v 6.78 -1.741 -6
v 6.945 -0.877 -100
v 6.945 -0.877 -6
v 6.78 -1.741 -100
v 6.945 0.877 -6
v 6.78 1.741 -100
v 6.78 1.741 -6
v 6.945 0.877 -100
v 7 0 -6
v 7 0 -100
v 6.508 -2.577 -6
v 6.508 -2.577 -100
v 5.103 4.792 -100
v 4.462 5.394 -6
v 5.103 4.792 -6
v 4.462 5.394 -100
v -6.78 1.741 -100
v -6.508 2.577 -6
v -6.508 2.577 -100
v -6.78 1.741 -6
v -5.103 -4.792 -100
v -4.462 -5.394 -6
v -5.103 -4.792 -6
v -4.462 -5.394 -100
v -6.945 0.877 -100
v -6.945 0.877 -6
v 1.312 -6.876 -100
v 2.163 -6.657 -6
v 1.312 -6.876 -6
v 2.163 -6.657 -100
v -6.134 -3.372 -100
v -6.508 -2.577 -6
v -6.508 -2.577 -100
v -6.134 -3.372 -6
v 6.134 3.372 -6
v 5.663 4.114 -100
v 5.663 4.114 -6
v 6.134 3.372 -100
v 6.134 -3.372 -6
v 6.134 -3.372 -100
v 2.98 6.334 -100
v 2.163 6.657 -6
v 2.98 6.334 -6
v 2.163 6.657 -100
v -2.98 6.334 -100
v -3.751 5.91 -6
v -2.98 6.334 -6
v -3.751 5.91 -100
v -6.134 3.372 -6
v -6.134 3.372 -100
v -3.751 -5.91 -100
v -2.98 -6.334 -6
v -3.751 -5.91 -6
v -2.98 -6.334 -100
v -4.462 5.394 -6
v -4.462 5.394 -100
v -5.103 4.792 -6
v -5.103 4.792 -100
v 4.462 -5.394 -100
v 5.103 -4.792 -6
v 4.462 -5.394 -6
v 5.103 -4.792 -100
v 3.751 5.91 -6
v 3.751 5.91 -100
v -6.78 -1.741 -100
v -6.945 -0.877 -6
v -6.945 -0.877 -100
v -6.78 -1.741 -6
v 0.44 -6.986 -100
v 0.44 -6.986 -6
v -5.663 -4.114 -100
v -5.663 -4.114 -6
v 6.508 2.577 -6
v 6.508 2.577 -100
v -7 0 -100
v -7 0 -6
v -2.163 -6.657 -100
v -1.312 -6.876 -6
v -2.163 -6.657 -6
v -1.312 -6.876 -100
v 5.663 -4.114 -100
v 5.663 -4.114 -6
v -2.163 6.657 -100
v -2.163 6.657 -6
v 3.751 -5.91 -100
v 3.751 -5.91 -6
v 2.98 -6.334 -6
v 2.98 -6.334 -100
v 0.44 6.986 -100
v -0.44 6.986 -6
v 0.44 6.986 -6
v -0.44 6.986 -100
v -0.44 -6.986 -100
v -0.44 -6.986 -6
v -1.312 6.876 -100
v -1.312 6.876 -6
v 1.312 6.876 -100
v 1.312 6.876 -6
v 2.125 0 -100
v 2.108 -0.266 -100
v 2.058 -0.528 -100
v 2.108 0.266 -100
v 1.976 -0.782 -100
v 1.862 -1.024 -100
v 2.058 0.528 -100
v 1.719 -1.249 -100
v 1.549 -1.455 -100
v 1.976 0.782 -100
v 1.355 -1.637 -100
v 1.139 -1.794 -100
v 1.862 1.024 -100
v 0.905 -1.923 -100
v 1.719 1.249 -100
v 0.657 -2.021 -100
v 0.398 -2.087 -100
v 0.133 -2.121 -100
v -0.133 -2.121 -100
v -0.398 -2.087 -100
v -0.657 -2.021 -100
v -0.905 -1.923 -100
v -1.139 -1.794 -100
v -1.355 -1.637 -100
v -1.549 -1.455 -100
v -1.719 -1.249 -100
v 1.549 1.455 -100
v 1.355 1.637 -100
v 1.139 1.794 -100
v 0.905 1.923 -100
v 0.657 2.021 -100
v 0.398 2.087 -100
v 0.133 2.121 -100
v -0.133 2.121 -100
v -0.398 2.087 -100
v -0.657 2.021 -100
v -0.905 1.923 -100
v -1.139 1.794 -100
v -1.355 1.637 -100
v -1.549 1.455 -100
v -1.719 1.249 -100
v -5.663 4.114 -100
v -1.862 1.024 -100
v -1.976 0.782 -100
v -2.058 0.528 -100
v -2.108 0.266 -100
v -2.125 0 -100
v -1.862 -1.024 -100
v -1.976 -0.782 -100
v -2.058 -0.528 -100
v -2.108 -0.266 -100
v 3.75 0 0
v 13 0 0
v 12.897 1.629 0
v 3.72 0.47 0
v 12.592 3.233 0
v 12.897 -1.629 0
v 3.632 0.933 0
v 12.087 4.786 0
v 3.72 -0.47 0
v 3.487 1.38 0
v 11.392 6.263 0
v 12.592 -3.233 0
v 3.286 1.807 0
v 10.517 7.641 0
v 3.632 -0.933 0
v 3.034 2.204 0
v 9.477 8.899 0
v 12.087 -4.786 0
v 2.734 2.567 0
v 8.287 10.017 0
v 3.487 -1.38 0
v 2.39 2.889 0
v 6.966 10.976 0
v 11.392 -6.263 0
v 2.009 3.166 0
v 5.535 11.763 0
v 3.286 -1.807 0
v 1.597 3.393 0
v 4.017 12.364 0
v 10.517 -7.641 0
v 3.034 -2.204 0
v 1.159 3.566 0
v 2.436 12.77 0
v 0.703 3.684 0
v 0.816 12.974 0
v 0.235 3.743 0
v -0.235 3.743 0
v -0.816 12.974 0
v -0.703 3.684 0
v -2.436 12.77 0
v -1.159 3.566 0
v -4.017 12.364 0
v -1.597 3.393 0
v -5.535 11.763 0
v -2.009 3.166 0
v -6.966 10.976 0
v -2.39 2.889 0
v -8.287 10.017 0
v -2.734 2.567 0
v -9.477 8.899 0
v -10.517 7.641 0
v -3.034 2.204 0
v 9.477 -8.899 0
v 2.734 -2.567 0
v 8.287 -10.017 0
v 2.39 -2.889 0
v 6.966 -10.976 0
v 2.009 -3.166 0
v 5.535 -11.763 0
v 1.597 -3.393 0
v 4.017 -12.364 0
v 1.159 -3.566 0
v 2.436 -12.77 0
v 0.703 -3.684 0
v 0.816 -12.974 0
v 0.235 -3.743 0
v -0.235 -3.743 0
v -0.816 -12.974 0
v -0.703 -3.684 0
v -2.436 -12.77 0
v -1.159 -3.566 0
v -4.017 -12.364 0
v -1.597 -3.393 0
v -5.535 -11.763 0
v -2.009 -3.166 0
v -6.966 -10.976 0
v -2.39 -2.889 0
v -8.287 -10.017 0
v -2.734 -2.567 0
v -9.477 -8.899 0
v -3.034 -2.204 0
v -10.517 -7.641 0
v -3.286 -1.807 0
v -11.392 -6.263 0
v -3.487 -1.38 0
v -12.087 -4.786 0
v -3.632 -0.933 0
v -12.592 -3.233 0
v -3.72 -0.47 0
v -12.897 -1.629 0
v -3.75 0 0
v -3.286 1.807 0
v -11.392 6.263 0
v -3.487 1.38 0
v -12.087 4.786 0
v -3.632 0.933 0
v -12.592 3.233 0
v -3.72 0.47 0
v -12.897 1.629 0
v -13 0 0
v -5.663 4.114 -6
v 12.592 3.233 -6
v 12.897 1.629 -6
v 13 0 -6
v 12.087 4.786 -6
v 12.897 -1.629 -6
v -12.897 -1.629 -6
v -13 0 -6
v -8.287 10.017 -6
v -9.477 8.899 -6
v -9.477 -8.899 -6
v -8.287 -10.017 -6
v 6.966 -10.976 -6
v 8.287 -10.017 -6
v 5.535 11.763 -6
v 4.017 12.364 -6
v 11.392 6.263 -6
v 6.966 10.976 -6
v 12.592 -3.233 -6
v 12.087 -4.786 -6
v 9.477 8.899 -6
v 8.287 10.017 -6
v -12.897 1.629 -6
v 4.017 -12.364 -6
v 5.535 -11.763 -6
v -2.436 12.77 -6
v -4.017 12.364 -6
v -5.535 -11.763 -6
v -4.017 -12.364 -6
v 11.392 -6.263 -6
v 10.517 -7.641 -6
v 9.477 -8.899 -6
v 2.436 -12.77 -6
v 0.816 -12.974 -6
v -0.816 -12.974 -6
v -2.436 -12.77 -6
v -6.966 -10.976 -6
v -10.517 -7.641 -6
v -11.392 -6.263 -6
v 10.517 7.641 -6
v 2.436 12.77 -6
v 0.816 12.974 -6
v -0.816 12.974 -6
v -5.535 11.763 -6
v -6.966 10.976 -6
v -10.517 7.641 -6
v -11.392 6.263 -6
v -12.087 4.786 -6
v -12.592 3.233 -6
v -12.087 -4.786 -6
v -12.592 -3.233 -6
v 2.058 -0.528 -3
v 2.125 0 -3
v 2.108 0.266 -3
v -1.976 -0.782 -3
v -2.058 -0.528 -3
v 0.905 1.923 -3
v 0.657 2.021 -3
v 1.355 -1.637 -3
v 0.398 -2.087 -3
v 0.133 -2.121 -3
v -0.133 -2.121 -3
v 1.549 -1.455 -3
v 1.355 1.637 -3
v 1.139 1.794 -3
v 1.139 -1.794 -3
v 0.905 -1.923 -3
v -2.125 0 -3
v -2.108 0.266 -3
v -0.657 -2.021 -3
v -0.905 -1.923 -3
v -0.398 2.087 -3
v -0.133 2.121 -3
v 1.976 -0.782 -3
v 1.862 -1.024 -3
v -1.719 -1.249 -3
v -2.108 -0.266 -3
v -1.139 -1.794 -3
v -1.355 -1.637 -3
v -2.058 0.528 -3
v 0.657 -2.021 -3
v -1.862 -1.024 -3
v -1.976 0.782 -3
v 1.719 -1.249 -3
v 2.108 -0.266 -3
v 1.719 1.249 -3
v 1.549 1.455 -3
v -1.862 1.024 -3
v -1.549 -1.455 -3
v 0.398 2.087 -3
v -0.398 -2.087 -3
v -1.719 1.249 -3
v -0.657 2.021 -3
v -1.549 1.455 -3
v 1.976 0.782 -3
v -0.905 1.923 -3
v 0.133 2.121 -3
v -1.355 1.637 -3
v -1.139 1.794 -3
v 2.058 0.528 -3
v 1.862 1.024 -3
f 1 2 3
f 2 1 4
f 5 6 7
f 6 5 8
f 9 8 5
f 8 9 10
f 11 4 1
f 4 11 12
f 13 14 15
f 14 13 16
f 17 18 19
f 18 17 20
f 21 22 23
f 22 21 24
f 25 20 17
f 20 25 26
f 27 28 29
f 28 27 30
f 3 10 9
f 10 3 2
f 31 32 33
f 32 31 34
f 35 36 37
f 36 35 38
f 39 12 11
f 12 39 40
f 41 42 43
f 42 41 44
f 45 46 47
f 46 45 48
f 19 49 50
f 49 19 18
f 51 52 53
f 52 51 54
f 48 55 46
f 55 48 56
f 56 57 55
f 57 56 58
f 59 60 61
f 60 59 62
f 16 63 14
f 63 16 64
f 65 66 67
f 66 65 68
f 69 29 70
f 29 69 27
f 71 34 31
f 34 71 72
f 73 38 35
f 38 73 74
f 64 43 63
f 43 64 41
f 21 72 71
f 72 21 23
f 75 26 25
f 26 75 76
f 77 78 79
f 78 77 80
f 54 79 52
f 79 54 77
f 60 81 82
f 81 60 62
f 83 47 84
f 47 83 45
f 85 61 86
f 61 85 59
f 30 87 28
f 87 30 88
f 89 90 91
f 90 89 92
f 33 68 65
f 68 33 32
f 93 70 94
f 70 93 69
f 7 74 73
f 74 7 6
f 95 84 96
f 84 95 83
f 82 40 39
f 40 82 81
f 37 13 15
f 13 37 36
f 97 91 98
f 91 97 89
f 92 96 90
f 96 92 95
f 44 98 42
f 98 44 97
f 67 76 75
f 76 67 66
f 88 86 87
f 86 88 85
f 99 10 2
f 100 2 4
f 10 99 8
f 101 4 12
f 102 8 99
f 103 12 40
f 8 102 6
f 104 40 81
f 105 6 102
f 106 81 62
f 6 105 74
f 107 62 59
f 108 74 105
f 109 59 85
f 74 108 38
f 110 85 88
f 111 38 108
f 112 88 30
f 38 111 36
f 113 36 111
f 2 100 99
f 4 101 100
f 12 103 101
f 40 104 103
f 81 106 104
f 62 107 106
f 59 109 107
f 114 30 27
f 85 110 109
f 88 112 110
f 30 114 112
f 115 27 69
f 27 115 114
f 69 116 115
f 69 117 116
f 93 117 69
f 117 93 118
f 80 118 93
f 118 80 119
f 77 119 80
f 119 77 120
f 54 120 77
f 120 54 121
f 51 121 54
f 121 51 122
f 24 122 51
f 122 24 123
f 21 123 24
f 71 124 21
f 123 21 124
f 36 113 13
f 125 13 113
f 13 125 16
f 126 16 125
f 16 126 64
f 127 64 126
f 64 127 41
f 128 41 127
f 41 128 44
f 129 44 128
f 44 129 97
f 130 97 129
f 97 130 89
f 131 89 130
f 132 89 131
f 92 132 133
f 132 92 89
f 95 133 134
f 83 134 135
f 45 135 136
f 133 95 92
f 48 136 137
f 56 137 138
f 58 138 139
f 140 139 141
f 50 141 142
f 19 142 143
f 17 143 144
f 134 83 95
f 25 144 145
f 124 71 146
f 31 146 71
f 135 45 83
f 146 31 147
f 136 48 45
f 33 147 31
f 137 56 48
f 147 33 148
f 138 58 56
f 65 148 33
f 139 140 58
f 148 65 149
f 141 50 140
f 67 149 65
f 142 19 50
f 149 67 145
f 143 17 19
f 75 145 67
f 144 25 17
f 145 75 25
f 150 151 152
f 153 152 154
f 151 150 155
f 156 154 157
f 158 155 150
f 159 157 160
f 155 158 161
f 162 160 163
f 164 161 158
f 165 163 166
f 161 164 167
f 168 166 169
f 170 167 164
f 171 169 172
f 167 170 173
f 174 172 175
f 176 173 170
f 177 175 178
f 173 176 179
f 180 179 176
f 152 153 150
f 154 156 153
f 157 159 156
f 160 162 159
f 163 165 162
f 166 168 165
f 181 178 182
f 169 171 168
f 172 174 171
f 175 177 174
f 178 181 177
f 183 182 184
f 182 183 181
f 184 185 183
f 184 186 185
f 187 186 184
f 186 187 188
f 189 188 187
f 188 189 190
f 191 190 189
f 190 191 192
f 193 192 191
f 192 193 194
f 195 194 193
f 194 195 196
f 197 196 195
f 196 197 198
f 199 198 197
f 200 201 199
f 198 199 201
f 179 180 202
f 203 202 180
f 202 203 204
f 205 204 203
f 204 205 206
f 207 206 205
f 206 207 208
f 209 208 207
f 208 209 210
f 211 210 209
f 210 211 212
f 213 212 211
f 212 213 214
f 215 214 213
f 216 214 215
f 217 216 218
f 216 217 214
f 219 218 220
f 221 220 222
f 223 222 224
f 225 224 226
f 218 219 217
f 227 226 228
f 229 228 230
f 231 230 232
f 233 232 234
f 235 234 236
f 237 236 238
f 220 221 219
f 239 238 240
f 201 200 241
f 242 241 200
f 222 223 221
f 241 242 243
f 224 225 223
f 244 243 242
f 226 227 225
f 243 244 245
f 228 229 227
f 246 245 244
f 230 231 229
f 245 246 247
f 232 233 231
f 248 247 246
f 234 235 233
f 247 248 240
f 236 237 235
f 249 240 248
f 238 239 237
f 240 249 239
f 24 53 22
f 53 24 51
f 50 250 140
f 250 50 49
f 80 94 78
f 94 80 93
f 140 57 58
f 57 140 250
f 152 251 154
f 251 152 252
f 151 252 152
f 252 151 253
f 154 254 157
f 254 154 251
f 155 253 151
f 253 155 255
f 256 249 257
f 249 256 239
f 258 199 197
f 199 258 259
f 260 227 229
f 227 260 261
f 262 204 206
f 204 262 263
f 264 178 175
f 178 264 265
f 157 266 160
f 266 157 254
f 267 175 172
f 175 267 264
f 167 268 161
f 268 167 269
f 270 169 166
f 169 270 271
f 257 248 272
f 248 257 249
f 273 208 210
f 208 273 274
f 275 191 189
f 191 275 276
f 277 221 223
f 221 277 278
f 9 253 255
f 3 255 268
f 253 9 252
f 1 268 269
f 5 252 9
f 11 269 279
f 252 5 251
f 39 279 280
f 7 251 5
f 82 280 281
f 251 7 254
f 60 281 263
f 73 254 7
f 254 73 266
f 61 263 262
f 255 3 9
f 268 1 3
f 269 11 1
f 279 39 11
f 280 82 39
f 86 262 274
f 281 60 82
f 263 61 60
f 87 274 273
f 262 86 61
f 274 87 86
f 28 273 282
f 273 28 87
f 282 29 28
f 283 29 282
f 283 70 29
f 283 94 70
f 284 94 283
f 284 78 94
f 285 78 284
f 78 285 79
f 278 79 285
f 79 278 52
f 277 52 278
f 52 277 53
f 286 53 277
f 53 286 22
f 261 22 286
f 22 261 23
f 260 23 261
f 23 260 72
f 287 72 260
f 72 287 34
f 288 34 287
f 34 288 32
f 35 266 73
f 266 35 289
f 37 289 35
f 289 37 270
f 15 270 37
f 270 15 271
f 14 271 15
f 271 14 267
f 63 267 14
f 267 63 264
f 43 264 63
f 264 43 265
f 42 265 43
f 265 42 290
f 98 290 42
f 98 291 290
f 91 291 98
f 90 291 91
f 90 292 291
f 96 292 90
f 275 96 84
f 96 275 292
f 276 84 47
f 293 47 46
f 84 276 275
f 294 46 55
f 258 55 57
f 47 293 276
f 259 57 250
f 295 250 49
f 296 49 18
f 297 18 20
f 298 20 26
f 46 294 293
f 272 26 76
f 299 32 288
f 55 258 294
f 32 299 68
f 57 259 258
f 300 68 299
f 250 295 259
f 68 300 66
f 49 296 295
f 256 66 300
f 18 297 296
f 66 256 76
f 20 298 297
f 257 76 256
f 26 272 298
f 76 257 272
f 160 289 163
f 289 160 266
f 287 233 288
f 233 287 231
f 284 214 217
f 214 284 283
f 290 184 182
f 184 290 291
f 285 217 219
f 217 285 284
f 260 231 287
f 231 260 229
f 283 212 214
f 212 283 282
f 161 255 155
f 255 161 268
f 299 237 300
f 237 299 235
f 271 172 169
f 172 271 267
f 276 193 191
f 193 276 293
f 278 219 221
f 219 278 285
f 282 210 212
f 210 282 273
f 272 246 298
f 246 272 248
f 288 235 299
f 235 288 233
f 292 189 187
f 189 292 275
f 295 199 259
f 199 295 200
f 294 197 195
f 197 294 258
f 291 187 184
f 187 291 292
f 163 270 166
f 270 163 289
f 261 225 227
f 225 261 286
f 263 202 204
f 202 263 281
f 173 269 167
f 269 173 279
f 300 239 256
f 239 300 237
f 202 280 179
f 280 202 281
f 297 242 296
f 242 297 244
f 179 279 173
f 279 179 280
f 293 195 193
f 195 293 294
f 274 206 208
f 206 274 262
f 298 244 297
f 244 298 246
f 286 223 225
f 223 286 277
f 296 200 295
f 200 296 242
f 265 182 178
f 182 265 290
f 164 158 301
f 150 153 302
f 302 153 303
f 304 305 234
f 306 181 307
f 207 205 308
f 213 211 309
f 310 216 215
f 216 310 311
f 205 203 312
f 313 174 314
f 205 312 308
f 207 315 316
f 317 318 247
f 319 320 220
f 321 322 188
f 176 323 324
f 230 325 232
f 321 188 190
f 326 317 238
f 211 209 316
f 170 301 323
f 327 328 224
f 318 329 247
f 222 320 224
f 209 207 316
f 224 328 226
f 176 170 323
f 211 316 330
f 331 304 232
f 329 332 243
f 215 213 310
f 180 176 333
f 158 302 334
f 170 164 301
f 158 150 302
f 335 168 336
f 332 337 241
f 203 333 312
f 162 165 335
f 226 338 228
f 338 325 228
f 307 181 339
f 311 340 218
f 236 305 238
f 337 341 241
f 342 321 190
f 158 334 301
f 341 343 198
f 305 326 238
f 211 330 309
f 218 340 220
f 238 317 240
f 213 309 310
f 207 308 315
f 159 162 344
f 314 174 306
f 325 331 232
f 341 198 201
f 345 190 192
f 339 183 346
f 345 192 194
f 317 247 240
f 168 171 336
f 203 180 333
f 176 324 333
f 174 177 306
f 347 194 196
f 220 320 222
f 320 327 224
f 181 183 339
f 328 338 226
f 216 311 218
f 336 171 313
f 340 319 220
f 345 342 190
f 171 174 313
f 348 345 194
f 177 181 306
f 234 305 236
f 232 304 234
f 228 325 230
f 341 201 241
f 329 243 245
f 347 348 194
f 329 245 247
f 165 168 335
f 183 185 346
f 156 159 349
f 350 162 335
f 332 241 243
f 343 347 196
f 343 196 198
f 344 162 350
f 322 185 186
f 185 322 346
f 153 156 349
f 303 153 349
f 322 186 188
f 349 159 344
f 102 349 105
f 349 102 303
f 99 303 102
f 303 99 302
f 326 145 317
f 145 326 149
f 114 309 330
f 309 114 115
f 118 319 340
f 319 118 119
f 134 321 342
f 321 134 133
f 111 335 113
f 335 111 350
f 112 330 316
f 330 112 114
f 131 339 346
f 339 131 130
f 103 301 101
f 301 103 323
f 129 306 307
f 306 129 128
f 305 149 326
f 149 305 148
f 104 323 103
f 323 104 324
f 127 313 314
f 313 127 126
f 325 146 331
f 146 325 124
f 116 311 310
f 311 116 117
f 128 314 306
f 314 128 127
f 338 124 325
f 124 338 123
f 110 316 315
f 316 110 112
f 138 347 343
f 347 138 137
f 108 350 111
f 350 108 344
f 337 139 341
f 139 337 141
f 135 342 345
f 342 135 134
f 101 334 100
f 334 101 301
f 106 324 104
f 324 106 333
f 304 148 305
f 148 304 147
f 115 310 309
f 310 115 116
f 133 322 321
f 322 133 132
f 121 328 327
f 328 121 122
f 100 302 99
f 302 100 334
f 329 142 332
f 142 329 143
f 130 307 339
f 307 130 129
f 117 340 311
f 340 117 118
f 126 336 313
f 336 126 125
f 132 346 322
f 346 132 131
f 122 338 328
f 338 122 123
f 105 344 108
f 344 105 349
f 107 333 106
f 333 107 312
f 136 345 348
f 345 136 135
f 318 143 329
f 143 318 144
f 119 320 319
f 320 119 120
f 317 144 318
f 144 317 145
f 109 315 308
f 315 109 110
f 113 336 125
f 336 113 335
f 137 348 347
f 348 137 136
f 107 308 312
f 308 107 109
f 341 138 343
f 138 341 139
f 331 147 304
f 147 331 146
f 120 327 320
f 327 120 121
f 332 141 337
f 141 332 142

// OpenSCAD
$fn = 50;


difference() {
	union() {
		translate(v = [0, 0, -100.0000000000]) {
			cylinder(h = 100, r = 7.0000000000);
		}
		translate(v = [0, 0, -6.0000000000]) {
			cylinder(h = 6, r = 13.0000000000);
		}
	}
	union() {
		translate(v = [0, 0, 0]) {
			rotate(a = [0, 0, 0]) {
				difference() {
					union() {
						#translate(v = [0, 0, -100.0000000000]) {
							cylinder(h = 100, r = 2.0000000000);
						}
						#translate(v = [0, 0, -3]) {
							cylinder(h = 3, r1 = 2.1250000000, r2 = 3.7500000000);
						}
						#translate(v = [0, 0, -100.0000000000]) {
							cylinder(h = 100, r = 2.1250000000);
						}
						#translate(v = [0, 0, -100.0000000000]) {
							cylinder(h = 100, r = 2.0000000000);
						}
					}
					union();
				}
			}
		}
	}
}
